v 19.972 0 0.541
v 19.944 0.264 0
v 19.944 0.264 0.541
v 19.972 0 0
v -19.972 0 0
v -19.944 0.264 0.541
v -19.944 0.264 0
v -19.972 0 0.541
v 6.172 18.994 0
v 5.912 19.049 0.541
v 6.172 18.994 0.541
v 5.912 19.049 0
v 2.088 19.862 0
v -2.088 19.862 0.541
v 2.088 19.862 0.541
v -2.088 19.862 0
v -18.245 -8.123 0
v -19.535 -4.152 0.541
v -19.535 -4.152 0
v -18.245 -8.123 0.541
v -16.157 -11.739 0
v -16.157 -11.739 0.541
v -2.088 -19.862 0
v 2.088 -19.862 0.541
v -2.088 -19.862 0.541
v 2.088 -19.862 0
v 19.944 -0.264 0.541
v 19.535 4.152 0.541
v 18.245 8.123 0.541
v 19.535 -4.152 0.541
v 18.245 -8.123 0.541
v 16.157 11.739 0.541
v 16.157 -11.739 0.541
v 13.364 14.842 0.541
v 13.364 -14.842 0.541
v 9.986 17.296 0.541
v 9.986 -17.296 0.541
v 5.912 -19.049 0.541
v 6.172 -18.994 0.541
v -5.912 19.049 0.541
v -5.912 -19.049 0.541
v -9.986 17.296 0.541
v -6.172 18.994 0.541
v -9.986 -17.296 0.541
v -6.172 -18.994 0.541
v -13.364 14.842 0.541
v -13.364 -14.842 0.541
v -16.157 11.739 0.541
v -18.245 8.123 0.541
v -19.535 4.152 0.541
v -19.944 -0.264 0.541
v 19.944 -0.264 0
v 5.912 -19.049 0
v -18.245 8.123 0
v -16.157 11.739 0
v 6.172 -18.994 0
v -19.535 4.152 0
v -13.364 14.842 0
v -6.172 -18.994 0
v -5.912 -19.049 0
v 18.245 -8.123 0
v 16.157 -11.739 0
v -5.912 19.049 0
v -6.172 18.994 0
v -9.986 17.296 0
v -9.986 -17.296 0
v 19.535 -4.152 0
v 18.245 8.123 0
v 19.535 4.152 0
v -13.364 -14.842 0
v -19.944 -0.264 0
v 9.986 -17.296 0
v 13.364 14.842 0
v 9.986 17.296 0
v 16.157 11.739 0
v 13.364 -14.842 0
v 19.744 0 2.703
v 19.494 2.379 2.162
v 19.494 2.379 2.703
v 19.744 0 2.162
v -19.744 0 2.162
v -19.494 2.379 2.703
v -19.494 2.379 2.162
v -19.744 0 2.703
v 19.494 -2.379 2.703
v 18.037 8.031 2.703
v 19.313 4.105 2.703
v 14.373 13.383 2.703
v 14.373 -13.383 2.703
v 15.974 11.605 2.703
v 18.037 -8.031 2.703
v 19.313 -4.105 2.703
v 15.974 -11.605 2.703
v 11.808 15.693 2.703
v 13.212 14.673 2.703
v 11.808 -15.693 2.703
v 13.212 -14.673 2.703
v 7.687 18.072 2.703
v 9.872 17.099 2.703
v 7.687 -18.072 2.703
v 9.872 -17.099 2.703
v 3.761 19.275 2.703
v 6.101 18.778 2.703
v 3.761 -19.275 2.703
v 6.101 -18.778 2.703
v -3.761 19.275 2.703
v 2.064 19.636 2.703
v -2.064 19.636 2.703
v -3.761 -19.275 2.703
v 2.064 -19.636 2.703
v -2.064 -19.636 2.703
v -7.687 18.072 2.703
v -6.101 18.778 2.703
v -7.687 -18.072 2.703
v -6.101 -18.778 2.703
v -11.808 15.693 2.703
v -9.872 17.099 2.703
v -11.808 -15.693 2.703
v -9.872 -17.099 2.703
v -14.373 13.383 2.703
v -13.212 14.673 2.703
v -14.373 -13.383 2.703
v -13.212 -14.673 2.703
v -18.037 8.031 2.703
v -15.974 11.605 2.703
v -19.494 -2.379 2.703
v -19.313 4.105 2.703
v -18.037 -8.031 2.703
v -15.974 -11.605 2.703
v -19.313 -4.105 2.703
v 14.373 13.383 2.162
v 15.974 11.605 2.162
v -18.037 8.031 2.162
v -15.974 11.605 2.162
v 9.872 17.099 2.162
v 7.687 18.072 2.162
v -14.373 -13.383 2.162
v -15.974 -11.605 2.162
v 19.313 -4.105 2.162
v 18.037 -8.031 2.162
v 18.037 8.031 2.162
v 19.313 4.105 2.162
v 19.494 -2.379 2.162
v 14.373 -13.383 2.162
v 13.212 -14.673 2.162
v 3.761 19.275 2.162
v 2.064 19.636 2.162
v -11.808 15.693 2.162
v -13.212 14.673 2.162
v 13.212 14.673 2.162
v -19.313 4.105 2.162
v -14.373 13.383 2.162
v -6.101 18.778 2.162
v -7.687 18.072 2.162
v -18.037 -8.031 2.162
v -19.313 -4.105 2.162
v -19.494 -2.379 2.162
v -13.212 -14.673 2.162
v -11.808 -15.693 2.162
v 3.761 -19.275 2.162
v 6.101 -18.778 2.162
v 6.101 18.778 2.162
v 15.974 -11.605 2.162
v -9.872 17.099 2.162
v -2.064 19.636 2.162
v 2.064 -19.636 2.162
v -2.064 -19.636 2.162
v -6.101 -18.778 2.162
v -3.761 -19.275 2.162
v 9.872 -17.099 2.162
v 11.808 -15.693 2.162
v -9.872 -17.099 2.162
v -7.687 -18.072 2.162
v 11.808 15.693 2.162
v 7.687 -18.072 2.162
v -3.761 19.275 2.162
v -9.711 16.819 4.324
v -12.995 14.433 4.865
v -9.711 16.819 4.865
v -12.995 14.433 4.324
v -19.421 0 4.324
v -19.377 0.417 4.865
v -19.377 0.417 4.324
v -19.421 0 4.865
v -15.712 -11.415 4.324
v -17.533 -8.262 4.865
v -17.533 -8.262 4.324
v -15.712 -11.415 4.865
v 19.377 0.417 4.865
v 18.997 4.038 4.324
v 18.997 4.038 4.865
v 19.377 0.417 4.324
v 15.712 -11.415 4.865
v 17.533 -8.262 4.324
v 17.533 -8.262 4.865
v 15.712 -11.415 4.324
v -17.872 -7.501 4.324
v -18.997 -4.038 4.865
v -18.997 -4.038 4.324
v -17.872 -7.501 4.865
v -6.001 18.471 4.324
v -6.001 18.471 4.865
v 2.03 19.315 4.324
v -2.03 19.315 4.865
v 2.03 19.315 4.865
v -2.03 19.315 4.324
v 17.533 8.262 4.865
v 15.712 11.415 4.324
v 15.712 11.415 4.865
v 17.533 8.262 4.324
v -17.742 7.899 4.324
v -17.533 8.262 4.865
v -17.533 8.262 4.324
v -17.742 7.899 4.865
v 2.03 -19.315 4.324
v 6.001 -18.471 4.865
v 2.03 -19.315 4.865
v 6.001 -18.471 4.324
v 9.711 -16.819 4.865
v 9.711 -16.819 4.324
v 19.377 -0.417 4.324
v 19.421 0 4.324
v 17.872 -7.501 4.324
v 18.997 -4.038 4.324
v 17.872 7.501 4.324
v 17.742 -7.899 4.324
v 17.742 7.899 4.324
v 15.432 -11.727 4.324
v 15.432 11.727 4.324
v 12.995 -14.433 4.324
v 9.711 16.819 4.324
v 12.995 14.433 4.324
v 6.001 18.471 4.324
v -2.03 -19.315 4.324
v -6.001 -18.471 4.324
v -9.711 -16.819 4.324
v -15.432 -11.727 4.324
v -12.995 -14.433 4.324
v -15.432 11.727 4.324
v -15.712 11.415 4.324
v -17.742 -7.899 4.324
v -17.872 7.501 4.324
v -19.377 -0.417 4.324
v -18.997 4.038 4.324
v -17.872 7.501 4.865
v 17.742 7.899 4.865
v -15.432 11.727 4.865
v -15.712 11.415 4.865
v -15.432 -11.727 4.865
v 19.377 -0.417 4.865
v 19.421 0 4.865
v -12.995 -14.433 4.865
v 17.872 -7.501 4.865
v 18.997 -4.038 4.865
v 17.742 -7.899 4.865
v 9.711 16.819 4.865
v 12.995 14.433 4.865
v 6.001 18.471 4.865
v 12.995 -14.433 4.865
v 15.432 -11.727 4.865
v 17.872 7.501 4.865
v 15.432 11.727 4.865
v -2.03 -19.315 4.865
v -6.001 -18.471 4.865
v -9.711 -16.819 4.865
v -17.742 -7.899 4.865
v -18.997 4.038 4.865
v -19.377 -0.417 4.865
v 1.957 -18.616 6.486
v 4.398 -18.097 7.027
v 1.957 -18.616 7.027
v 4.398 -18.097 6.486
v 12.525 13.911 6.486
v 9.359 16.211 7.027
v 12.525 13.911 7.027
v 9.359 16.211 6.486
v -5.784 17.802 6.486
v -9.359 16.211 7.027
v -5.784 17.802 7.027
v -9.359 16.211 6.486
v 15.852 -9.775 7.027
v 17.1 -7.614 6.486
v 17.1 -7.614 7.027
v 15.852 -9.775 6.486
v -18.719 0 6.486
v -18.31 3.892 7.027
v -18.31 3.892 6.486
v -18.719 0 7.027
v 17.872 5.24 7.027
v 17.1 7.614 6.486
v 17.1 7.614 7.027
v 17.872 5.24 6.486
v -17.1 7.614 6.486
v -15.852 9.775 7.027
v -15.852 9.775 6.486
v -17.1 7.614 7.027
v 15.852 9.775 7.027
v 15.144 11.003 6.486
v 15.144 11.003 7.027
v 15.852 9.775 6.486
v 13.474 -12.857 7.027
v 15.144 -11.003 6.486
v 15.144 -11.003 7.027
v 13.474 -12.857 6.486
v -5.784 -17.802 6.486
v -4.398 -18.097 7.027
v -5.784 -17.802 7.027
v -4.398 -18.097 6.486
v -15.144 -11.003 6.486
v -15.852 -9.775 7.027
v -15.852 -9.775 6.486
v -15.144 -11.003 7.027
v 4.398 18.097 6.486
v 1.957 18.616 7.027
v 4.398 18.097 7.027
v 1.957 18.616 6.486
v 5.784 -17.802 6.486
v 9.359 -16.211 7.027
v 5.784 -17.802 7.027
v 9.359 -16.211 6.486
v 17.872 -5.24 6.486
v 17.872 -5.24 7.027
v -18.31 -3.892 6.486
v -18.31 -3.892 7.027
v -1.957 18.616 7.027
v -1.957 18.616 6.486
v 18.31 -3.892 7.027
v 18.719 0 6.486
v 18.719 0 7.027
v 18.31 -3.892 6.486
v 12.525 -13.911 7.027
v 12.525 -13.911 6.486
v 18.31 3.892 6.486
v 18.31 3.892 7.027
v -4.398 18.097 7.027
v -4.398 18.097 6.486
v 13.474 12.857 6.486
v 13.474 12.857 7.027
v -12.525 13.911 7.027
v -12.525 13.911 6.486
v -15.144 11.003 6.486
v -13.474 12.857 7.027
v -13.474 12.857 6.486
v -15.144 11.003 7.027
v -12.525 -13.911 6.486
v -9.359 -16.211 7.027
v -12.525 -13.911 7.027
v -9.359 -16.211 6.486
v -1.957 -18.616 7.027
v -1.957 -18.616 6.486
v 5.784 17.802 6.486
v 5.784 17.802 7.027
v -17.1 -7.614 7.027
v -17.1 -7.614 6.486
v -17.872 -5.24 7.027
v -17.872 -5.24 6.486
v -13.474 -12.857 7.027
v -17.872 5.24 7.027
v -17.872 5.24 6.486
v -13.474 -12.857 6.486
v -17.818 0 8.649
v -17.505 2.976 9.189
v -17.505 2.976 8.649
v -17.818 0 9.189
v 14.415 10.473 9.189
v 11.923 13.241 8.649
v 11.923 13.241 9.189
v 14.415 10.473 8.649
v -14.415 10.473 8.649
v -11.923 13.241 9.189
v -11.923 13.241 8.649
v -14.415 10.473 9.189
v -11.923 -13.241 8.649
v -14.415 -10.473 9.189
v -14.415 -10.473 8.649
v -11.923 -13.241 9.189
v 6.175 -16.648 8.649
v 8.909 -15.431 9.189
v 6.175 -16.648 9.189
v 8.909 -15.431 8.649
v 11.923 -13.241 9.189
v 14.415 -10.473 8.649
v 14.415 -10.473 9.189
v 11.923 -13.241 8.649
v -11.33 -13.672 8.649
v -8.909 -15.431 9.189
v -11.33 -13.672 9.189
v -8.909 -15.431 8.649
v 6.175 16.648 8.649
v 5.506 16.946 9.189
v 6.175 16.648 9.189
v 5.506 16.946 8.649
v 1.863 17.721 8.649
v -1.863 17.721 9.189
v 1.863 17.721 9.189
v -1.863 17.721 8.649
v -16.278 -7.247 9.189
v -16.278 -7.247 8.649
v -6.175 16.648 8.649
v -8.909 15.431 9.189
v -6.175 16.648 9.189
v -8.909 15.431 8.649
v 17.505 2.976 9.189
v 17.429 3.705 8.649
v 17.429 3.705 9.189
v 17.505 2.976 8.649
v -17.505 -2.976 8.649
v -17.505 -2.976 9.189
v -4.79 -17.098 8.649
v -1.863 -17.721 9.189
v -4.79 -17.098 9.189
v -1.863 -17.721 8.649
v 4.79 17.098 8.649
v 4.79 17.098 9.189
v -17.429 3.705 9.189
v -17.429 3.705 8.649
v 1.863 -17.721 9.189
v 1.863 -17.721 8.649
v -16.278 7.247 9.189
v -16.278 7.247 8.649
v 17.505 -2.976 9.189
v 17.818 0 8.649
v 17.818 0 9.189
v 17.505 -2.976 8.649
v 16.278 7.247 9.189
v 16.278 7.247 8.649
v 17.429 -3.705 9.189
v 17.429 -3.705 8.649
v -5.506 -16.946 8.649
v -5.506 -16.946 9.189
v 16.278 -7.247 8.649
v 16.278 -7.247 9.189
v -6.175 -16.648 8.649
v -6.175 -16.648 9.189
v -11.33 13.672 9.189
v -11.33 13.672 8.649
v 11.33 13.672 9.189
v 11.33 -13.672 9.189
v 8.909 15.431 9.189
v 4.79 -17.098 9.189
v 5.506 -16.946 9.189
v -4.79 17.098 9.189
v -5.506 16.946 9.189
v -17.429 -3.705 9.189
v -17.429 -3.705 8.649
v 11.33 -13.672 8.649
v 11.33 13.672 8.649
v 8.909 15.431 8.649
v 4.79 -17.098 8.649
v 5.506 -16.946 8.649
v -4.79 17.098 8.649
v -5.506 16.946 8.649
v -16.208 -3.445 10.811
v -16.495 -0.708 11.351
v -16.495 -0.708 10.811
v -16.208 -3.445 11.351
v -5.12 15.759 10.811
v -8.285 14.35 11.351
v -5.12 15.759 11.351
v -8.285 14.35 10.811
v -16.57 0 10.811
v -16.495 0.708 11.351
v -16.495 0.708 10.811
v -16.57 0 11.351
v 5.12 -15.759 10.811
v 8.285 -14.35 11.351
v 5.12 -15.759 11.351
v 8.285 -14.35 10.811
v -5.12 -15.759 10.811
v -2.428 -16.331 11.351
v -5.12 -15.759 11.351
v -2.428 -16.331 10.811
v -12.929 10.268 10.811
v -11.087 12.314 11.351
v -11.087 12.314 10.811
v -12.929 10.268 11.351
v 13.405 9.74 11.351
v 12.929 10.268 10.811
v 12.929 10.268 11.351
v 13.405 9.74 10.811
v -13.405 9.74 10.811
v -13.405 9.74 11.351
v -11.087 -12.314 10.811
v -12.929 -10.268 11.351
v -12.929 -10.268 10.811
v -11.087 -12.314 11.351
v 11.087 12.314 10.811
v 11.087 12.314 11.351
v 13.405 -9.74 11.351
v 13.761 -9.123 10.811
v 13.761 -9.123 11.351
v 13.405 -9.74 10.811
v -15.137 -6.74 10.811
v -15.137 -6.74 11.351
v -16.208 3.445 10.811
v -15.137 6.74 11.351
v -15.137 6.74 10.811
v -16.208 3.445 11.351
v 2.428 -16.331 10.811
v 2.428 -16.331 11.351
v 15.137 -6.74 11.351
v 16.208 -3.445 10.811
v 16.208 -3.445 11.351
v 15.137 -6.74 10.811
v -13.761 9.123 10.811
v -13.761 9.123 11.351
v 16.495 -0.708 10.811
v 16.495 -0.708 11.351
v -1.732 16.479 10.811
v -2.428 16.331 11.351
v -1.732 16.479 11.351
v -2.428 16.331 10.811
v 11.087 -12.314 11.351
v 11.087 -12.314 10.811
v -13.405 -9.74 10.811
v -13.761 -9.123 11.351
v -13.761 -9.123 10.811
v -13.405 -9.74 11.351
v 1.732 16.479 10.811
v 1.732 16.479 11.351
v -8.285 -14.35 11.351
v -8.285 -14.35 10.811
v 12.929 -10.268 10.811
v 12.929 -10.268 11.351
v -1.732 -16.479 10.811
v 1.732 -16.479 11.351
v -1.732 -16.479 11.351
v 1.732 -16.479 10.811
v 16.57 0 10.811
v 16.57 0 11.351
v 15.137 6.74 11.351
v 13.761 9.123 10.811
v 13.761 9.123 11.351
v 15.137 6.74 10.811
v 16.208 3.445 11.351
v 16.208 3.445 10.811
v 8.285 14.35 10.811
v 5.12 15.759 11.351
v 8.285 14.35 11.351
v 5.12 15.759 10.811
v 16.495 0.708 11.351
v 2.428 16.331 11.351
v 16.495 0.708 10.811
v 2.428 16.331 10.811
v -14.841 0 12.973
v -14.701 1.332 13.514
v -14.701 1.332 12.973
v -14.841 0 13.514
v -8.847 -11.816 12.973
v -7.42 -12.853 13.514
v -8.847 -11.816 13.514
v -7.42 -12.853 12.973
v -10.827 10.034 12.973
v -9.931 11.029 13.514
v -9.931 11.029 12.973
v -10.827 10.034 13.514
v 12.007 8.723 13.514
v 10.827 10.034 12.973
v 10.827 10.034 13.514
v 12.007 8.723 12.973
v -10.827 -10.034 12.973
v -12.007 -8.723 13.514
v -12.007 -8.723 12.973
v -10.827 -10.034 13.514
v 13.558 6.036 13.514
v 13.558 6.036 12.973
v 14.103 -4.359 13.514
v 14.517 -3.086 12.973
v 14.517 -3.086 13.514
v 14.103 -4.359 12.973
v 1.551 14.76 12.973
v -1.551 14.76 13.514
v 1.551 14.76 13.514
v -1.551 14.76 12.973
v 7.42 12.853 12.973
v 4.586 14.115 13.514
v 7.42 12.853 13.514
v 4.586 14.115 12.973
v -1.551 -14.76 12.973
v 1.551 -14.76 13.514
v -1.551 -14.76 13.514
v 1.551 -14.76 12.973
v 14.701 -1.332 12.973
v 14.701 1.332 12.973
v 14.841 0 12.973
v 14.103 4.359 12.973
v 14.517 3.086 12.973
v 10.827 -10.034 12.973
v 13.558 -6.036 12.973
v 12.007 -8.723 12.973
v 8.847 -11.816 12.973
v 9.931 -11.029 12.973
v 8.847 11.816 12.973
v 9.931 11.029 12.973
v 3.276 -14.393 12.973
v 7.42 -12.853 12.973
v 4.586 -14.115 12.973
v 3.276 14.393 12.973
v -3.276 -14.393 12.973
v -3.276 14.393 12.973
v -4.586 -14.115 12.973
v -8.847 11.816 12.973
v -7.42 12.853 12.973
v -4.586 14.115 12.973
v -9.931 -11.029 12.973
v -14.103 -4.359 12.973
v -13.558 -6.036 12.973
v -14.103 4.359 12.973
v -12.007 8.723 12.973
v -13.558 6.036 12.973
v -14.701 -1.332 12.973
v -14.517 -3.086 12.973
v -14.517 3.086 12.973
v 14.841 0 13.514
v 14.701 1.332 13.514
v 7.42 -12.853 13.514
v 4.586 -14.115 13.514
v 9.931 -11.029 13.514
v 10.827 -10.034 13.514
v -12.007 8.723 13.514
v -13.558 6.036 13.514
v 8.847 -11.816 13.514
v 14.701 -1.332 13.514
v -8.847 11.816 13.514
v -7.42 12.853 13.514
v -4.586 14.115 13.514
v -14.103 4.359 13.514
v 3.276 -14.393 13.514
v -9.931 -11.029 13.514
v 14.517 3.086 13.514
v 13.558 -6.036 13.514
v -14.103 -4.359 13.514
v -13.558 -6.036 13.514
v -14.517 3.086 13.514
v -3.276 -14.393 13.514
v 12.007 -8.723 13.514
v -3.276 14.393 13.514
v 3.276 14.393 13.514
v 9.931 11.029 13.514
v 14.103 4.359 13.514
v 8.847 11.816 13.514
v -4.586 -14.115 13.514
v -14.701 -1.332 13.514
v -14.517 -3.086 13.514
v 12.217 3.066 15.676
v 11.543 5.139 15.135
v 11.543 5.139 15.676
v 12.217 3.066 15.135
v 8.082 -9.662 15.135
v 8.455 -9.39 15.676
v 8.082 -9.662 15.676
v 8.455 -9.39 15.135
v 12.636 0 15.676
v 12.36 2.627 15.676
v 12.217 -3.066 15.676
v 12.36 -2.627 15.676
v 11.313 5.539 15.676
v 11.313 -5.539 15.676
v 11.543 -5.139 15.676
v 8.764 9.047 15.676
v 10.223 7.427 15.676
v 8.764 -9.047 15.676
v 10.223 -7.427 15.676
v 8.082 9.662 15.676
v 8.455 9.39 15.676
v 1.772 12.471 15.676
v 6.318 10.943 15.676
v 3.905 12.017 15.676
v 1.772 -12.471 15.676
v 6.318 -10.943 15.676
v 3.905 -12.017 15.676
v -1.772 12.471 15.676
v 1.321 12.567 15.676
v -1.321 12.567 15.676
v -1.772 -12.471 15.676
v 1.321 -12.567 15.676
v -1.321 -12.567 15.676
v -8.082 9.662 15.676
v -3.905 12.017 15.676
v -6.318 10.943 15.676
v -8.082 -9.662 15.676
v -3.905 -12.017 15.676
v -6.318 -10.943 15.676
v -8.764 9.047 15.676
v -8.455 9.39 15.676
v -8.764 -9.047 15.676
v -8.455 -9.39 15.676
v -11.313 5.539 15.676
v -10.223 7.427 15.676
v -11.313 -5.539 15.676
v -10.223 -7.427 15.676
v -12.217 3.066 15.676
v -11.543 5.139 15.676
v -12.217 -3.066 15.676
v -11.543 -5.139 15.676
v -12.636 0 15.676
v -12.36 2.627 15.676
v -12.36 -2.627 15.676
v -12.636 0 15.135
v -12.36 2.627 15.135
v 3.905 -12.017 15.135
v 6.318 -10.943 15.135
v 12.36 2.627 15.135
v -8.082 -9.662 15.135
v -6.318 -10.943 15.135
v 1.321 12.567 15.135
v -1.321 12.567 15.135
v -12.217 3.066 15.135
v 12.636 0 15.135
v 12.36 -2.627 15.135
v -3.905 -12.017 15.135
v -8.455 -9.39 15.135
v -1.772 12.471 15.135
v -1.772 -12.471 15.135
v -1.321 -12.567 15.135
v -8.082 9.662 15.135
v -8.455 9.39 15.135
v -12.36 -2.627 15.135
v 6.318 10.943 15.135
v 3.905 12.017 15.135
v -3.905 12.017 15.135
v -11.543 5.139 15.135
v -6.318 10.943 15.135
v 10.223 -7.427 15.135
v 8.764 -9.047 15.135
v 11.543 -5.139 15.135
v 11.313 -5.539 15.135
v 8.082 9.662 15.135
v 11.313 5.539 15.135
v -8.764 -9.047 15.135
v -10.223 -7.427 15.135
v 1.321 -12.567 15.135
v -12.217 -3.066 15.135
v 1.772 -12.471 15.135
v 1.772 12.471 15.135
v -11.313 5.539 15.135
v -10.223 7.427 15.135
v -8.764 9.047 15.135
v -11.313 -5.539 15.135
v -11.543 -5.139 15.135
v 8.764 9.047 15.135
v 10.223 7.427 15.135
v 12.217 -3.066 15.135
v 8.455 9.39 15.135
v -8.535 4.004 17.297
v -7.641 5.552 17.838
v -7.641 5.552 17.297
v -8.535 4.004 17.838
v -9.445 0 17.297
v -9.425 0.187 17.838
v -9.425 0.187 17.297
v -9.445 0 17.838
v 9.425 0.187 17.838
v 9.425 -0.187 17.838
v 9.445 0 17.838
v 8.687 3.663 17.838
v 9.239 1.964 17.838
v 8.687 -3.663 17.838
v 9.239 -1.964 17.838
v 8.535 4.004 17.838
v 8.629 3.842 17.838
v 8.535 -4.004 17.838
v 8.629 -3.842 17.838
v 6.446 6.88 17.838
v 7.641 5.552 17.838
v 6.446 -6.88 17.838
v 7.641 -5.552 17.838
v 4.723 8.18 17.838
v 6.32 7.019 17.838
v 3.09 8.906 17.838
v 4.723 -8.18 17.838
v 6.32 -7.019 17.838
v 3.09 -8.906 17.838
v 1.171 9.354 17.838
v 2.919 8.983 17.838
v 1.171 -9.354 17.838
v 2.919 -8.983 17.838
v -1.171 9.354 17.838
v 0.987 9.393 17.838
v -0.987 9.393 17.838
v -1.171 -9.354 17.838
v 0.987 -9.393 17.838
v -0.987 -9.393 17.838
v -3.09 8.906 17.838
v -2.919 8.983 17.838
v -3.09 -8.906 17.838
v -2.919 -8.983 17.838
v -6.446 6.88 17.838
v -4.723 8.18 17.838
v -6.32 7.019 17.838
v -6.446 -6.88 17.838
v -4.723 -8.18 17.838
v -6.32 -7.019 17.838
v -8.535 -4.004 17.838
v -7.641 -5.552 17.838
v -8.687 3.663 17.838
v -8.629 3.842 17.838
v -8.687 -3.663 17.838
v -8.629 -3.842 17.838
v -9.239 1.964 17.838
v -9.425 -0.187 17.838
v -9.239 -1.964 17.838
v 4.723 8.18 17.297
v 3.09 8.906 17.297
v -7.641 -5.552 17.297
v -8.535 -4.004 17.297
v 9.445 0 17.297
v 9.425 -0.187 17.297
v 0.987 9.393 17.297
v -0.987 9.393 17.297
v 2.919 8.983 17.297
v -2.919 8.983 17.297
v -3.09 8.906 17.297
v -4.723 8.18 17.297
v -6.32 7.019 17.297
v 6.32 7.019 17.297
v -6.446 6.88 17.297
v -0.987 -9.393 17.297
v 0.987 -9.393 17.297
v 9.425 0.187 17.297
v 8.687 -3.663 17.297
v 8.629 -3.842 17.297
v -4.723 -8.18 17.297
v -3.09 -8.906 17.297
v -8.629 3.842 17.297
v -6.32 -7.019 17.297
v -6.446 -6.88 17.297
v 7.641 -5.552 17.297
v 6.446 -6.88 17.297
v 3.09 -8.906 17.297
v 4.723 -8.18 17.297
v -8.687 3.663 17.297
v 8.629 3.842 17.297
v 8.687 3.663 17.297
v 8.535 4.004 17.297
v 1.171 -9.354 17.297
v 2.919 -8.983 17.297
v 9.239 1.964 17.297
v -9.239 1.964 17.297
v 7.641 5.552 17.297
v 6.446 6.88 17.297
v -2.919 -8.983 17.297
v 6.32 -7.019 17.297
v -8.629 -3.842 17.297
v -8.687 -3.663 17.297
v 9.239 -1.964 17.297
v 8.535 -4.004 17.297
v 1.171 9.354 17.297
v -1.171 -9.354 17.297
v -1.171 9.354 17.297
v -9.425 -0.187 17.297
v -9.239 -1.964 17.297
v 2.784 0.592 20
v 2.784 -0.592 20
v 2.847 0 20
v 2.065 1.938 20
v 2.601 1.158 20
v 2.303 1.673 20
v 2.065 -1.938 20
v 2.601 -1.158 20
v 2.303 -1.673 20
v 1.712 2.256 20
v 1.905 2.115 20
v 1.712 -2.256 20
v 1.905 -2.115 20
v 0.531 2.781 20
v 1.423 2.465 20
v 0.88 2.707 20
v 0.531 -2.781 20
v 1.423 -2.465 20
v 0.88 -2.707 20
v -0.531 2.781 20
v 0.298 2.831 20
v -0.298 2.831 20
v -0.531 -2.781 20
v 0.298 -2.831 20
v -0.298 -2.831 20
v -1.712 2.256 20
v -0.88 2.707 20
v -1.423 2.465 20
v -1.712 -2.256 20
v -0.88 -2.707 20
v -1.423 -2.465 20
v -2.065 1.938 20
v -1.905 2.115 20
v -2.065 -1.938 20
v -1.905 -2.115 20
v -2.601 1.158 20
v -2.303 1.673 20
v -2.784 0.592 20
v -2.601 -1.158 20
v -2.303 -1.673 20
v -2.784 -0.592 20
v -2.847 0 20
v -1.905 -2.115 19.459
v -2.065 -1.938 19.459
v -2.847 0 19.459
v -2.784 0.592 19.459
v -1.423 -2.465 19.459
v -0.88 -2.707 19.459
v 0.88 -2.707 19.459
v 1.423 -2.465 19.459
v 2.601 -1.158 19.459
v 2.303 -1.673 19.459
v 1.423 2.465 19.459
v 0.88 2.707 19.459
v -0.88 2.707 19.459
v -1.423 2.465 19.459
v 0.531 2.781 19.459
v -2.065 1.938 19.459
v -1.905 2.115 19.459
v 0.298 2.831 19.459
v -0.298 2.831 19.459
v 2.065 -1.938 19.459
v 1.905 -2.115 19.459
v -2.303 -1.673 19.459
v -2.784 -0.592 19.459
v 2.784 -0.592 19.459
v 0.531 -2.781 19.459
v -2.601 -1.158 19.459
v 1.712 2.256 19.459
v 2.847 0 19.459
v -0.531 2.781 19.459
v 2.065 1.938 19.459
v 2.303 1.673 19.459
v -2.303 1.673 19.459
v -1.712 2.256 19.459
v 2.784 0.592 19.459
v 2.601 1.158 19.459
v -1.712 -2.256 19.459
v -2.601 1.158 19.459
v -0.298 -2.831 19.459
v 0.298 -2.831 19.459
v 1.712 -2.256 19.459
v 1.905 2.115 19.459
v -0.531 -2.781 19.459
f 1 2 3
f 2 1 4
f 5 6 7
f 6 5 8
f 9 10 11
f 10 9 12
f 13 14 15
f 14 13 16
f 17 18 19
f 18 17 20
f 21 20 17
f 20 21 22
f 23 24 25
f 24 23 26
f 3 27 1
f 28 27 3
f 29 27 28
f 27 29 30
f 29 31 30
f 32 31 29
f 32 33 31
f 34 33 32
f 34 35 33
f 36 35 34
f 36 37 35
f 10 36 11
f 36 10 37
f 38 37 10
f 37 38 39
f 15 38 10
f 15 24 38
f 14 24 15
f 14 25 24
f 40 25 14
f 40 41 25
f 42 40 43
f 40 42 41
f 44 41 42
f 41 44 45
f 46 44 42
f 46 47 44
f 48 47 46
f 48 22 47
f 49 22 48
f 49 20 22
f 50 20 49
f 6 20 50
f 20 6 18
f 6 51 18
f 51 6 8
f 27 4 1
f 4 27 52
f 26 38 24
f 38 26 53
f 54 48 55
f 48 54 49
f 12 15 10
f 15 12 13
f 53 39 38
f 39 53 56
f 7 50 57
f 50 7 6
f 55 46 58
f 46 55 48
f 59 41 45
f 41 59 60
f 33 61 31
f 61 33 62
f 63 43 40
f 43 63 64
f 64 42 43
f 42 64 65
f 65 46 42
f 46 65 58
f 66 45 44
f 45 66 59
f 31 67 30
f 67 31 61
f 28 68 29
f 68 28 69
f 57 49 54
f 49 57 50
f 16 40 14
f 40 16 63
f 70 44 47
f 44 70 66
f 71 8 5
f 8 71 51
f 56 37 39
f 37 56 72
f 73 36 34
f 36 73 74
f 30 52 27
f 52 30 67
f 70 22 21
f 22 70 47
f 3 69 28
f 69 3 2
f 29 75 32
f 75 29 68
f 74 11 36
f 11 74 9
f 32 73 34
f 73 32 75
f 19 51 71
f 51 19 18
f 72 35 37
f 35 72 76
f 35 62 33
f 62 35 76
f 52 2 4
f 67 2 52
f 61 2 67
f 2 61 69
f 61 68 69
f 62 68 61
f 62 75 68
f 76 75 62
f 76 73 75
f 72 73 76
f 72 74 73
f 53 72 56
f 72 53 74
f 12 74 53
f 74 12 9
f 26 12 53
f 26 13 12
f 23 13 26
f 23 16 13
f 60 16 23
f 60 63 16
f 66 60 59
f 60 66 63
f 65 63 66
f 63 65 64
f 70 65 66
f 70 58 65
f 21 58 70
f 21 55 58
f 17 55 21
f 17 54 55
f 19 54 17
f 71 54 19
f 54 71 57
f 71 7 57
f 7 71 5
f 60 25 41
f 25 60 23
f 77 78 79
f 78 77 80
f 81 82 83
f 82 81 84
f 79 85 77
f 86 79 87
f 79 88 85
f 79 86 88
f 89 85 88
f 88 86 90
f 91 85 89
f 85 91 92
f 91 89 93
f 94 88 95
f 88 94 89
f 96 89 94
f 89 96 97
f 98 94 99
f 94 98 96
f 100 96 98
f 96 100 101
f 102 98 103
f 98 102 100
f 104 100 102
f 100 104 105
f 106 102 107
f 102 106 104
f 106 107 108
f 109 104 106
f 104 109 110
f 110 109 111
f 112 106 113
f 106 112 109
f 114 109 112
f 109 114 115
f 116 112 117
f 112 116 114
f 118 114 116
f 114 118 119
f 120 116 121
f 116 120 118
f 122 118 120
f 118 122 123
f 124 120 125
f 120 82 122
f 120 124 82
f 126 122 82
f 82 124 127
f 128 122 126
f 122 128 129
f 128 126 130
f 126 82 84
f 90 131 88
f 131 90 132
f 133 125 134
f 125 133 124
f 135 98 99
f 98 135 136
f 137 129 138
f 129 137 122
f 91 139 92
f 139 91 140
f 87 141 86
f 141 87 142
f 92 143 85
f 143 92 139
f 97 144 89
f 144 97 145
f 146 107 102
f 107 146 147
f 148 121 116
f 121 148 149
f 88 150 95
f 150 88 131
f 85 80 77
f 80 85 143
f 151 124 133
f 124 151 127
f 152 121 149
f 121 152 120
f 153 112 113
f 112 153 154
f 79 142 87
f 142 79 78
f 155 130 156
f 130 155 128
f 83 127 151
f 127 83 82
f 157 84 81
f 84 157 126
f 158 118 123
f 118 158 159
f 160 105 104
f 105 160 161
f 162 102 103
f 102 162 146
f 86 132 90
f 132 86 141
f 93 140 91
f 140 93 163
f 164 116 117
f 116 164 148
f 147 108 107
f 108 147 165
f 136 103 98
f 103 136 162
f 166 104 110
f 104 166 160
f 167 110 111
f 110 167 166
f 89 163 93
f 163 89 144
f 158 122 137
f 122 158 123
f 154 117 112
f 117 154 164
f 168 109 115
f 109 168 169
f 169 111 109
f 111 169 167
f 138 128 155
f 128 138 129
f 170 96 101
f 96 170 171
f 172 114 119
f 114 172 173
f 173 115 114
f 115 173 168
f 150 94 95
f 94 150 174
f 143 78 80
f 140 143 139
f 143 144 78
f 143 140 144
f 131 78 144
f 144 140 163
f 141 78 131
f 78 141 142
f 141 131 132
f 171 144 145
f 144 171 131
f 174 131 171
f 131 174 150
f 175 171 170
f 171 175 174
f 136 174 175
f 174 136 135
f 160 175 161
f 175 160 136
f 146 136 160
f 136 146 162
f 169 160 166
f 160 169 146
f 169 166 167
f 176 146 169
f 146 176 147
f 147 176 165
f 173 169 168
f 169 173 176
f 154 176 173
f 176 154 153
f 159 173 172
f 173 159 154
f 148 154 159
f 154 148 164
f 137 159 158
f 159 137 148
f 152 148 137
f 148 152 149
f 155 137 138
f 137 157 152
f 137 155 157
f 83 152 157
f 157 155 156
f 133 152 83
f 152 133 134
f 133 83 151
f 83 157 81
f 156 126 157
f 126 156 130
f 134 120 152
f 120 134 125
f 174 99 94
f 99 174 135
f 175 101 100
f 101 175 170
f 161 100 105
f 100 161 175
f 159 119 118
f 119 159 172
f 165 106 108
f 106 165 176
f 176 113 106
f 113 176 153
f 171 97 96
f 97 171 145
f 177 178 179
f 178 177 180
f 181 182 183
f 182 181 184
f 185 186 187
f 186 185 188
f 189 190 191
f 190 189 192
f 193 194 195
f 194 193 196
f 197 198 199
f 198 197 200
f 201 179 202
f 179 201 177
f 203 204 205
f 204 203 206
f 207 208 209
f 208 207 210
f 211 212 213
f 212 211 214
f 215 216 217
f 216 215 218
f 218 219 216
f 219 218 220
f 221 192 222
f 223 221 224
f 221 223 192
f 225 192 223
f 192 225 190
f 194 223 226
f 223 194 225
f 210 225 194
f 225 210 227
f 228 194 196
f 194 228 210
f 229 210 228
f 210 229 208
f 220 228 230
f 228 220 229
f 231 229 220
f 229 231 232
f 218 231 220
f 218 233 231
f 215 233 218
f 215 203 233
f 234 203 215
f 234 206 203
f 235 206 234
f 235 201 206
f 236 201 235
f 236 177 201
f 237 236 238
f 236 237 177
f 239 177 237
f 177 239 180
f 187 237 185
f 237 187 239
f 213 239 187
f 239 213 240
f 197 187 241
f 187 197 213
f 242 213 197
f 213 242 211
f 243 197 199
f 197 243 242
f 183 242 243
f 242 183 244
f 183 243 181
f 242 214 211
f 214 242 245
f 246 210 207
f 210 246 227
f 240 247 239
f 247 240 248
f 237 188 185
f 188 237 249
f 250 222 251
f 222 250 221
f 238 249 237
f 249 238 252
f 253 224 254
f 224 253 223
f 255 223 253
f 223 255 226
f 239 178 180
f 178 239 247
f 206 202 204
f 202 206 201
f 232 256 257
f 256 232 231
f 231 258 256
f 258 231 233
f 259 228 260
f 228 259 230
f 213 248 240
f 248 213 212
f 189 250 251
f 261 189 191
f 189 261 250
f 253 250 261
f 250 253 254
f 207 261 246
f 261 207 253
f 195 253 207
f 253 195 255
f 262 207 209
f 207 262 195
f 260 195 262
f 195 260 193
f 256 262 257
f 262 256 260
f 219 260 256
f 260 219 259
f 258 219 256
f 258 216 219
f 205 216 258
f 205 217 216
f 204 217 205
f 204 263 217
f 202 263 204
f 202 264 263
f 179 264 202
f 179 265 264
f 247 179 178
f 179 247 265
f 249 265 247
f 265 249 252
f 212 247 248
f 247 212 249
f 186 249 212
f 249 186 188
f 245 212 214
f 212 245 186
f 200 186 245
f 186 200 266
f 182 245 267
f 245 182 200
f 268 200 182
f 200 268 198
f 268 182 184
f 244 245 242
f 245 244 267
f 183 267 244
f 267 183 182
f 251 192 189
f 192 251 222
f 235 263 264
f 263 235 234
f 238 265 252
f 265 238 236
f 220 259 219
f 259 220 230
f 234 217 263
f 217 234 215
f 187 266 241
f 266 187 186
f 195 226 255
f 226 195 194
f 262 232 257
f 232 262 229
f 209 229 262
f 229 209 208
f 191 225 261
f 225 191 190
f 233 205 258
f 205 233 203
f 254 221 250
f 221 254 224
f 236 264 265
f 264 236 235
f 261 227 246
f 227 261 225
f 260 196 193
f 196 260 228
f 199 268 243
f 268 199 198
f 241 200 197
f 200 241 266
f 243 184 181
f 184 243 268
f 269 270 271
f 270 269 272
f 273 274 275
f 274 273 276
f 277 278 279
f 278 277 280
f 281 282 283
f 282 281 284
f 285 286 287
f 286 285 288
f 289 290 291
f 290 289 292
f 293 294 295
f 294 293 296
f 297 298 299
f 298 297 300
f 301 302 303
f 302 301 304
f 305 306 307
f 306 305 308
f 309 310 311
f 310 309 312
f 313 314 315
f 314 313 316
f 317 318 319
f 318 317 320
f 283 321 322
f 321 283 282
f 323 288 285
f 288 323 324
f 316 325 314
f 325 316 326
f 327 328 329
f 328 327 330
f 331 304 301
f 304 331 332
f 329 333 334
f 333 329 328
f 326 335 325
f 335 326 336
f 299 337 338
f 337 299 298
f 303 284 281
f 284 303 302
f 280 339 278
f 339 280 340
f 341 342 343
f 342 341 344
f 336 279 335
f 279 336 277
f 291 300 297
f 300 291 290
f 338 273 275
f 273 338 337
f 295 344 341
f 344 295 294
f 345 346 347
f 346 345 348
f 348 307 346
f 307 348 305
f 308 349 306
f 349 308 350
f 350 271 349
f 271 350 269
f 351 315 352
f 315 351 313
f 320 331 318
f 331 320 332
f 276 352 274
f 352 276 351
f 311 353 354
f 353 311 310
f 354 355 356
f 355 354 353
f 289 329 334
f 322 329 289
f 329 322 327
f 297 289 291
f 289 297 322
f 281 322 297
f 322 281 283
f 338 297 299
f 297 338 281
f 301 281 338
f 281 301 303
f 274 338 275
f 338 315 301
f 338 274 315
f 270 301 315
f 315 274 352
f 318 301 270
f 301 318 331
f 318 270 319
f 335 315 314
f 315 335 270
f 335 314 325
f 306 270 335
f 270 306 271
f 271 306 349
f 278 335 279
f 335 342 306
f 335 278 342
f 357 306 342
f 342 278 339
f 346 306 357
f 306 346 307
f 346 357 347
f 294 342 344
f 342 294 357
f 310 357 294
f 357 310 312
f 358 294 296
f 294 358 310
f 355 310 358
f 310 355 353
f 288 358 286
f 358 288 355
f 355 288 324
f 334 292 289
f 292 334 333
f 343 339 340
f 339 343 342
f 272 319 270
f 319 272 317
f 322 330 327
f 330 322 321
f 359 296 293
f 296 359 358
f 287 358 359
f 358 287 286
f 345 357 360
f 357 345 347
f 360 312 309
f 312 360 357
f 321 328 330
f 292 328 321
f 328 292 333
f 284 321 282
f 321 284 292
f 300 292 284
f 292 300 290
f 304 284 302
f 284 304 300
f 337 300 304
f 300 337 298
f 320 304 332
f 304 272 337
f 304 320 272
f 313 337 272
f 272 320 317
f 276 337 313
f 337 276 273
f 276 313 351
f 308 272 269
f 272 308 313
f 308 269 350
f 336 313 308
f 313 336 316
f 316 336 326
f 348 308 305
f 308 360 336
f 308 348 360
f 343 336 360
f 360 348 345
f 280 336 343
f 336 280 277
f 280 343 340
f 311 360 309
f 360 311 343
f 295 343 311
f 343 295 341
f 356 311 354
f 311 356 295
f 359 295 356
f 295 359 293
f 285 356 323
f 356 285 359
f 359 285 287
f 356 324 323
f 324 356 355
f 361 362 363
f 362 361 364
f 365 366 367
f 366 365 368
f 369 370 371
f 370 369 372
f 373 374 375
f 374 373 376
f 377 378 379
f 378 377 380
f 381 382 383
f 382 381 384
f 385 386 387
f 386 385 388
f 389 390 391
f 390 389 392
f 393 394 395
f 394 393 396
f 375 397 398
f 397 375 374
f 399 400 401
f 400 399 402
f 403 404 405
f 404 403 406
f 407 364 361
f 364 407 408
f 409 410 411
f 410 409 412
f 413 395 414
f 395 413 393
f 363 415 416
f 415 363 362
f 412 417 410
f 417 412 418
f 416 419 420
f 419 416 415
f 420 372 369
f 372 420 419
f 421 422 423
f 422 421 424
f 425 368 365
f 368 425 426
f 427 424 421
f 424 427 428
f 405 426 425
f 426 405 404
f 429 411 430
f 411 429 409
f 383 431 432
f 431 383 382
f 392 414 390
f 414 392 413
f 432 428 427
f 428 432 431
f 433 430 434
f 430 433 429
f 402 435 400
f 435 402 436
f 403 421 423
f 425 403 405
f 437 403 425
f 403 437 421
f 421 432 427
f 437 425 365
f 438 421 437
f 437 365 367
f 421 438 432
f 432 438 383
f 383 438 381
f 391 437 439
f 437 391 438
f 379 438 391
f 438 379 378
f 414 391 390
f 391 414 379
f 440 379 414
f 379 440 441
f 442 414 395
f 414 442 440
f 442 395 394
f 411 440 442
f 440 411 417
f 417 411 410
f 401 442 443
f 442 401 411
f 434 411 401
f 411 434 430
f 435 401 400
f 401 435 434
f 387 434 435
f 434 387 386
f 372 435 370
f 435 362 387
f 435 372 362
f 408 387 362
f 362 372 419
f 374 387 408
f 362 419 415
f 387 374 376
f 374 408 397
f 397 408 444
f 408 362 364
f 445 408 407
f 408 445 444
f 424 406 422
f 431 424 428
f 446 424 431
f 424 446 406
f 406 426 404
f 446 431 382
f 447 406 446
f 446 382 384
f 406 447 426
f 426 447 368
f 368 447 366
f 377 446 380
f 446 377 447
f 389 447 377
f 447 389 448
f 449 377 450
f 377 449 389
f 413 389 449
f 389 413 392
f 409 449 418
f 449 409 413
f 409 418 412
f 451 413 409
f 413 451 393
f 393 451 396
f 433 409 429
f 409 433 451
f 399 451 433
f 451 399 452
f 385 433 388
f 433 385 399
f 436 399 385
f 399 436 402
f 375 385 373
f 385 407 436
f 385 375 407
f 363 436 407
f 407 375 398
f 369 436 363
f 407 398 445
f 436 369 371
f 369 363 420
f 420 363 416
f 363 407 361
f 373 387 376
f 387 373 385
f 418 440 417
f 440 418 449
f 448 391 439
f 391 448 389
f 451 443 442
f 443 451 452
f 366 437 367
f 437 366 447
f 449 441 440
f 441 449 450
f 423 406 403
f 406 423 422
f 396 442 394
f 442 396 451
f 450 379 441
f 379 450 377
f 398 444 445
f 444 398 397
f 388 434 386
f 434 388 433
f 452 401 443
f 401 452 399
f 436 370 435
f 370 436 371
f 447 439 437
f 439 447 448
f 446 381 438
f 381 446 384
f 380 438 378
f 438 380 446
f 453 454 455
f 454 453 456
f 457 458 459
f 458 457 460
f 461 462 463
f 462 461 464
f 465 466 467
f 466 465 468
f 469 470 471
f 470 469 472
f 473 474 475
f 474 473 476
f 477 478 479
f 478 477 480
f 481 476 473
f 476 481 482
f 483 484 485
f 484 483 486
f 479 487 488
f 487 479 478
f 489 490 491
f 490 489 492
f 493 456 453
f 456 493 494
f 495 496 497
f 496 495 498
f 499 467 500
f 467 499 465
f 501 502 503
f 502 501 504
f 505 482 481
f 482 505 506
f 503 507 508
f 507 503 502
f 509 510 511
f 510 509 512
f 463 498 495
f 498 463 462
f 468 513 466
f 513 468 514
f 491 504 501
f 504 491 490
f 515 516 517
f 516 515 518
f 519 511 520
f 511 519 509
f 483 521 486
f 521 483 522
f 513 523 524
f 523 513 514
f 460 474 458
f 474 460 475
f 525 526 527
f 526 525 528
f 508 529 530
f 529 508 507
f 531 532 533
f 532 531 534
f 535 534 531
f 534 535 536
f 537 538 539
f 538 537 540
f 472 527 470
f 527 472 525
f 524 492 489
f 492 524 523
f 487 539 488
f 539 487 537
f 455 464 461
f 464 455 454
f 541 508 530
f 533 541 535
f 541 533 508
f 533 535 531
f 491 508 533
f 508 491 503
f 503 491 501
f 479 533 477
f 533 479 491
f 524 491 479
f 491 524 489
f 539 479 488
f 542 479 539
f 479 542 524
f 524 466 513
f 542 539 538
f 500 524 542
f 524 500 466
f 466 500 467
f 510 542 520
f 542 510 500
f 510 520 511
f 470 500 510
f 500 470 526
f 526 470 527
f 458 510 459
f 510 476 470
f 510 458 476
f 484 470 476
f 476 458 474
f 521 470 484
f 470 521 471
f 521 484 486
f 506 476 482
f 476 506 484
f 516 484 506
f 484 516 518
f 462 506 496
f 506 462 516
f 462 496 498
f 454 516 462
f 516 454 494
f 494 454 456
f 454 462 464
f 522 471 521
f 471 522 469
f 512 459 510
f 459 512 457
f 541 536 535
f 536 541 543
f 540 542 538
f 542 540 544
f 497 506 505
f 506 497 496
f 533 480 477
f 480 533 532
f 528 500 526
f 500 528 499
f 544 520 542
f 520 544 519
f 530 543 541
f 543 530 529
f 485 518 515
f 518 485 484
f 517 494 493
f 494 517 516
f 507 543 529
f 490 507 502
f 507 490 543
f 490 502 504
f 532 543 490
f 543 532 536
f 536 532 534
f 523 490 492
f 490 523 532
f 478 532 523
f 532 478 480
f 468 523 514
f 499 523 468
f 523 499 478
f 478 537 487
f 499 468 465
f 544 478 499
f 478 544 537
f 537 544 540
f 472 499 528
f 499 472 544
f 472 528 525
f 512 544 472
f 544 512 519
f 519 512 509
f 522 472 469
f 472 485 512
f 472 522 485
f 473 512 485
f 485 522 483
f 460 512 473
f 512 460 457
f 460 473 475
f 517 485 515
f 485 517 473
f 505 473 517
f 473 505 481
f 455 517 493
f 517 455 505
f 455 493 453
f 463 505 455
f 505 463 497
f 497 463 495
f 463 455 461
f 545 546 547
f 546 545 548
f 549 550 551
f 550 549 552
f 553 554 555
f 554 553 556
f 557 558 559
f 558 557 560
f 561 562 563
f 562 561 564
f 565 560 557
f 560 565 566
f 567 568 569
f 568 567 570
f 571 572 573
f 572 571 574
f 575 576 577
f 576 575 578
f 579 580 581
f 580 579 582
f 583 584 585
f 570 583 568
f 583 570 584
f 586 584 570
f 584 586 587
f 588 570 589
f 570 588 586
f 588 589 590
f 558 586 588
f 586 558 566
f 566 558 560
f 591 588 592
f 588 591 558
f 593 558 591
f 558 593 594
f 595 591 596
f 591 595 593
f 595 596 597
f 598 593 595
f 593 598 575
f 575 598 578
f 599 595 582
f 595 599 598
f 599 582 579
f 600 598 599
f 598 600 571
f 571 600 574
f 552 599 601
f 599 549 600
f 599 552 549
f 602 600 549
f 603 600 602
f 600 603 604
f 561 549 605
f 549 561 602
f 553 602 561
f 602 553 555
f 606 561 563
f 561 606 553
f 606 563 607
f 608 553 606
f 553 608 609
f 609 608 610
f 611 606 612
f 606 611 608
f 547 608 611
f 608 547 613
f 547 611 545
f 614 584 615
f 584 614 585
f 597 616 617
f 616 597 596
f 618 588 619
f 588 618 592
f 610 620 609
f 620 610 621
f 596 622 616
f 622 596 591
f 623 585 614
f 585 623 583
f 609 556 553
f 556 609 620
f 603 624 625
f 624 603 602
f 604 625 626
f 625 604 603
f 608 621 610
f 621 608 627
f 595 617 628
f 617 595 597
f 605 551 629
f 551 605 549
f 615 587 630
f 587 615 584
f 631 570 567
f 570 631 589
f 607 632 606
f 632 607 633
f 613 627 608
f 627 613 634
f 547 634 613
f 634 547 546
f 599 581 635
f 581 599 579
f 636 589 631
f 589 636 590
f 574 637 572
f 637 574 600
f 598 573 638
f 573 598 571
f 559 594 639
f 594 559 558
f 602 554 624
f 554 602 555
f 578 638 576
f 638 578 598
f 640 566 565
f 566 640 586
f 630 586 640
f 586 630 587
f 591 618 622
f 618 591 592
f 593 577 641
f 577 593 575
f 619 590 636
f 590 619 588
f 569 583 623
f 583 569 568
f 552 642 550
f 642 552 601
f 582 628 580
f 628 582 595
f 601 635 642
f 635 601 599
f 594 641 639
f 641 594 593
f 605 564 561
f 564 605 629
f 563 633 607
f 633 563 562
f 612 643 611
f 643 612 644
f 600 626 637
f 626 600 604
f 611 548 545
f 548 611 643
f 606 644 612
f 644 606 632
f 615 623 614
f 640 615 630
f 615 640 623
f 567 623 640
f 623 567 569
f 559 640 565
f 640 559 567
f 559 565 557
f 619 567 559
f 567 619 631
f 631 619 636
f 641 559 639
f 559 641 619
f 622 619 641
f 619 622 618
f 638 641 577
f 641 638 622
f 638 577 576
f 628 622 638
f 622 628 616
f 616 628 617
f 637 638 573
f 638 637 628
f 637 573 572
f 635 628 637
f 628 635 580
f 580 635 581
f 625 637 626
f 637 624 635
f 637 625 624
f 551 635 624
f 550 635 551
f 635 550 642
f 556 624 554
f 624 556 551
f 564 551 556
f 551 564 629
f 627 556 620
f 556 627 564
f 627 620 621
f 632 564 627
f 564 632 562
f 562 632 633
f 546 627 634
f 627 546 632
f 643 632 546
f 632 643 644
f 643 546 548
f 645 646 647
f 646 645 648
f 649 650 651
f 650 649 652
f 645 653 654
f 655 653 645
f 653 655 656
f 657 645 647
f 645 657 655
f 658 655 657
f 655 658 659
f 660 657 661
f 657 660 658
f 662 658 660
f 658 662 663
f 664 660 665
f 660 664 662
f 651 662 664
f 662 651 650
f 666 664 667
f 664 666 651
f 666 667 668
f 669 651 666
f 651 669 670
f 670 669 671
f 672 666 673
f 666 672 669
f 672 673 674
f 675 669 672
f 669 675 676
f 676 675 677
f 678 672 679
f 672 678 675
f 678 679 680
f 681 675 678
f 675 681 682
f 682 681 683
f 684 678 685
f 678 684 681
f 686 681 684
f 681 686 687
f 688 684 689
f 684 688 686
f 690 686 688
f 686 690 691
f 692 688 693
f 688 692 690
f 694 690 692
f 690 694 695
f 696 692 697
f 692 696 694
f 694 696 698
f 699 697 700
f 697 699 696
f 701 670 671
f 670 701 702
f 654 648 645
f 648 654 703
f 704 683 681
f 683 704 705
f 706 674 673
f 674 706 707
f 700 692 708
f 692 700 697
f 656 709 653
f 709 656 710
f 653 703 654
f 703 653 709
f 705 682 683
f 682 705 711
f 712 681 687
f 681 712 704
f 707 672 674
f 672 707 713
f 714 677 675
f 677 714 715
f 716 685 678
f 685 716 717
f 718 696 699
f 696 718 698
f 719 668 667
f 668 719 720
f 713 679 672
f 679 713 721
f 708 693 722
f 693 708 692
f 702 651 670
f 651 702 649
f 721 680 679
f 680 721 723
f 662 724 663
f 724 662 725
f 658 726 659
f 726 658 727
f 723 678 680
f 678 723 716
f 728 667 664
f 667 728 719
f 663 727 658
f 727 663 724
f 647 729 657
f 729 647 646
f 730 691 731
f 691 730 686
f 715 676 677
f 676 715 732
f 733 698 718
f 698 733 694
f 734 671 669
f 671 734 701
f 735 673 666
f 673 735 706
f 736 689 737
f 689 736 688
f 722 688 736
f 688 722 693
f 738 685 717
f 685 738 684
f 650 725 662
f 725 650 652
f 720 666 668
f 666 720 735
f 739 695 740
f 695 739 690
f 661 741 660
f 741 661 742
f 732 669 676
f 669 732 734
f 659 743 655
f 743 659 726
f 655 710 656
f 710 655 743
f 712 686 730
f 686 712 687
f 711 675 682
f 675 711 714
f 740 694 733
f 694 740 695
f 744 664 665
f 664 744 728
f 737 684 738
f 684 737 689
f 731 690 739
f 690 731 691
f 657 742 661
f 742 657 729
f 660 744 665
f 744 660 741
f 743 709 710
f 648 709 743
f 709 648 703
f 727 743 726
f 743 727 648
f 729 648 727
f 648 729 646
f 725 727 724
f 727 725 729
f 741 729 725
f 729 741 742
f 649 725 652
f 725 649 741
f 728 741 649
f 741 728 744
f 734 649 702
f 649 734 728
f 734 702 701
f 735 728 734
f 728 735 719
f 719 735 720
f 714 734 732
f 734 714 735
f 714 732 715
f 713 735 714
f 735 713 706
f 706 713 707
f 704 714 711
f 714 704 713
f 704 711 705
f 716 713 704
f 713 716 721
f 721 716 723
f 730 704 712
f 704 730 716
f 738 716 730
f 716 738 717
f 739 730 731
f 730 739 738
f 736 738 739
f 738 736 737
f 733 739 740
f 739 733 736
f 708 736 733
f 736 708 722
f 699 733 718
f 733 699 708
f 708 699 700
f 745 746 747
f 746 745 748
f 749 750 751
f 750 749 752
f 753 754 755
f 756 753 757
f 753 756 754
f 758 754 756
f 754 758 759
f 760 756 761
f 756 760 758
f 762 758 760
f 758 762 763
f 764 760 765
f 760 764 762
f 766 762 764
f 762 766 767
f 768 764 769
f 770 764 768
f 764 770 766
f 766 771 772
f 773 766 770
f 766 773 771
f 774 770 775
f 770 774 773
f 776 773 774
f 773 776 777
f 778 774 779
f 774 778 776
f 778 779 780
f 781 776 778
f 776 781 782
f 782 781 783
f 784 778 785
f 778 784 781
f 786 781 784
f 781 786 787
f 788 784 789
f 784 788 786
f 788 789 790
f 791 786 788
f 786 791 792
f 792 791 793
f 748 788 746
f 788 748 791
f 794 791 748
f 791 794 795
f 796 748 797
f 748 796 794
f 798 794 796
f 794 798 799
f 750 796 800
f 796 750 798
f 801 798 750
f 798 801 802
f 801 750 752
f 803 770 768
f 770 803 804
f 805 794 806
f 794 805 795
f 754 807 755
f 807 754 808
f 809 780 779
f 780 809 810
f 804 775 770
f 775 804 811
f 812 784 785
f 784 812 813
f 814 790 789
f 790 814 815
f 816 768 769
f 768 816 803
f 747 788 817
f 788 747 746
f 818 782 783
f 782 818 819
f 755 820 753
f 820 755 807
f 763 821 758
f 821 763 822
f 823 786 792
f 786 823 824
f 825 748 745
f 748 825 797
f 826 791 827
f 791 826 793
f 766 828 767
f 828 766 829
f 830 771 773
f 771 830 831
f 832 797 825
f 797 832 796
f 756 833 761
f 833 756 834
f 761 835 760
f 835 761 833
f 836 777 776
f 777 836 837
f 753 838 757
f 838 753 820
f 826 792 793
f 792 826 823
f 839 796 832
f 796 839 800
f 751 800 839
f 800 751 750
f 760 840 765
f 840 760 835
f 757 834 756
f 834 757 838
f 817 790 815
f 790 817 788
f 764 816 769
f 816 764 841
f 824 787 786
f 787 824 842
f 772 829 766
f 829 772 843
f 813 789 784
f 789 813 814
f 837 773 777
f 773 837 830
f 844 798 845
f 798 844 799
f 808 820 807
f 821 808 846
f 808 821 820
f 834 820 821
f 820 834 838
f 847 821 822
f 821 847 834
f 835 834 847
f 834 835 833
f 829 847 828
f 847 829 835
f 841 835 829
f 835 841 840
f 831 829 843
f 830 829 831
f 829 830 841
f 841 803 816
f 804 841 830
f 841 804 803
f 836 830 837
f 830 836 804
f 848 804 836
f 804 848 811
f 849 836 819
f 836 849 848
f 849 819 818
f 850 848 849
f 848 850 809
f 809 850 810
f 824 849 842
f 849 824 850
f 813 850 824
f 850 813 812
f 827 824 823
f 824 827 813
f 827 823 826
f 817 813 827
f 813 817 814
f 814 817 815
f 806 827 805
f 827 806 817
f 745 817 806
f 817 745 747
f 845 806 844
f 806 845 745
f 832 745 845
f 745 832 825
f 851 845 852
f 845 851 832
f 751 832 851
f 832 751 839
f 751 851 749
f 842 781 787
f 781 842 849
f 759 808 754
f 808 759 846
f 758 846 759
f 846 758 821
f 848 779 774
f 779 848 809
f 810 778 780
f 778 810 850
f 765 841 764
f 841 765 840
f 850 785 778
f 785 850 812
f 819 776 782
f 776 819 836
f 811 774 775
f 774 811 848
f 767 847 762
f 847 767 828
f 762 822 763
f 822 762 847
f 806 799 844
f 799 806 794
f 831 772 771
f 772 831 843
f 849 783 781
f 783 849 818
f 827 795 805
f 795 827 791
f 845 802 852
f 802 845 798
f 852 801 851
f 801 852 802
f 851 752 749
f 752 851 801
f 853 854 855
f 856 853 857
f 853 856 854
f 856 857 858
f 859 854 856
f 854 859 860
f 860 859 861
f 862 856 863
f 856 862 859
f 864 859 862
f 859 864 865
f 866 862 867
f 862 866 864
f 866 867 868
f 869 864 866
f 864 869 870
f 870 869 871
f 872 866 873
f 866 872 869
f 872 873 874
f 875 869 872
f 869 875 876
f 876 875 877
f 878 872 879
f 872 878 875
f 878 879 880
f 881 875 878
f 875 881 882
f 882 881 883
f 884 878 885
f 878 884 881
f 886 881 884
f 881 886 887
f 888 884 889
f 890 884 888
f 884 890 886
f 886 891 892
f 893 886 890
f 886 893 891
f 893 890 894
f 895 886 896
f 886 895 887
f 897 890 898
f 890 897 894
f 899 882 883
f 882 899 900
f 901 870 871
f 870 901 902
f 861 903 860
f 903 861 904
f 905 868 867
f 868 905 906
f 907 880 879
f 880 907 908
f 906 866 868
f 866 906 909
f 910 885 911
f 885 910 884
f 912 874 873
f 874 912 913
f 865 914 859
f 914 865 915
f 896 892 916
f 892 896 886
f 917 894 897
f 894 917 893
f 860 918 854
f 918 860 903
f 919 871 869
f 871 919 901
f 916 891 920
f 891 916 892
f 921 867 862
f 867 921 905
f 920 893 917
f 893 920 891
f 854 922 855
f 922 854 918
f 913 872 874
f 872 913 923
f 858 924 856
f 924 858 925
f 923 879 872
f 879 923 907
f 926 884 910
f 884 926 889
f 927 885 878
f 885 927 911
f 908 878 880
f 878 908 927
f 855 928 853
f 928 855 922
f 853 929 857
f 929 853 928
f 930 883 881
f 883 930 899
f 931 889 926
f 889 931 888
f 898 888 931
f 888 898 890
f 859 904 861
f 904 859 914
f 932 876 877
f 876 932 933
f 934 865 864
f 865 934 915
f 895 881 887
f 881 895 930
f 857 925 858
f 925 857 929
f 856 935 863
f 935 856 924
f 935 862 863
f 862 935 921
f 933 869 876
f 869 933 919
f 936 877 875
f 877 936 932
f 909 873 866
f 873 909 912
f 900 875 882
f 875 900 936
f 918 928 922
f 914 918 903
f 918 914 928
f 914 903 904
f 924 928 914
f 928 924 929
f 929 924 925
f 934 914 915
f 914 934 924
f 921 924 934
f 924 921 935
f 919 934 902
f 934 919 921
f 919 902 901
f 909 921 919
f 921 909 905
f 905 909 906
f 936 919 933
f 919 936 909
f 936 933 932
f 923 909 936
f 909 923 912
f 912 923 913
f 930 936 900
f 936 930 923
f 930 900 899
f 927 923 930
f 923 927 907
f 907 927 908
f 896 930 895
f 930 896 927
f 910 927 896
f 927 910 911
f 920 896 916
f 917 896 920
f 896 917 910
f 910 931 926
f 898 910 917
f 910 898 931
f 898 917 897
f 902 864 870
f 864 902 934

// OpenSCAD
$fn = 30;

/*shape_height = 20;
slice_number = 10;
stepped = false;
flatten = false;*/


slice_ratio = 3.0;
//slice ratio is the ratio between the width of the slice and the width of the open space

//~~~~~~~~~~~~~~~~~~~~~~~~~~~~~~~~~~~~~~~~~~~~~~~~~~~~~~~~~~~~~~~~~~~



slicer(stepped = true, flatten = false, slice_number = 10, shape_height = 20) sphere(20);



/*

Needed: item dimensions(x,y,z), fill percentage, steppped(boolean), flatten(boolean)


Stuff to do: 
- height determination
- object maxium dimensions
- pass array of output slices

*/

module slicer(stepped, flatten, slice_number, shape_height){
    slice_thickness = shape_height/(slice_number +(slice_number-1)*slice_ratio);
    gap_thickness = slice_thickness*slice_ratio;
    
    if(stepped == false){
        if(flatten == false){
            slice_preview(slice_number, slice_thickness, gap_thickness)children();
        }
        else{
            slice_maker(slice_number, slice_thickness, gap_thickness)children();
        }
    }
    else{
        if(flatten == false){
            stepped_slice_preview(slice_number, slice_thickness, gap_thickness)children();
        }
        else{
            stepped_slice_maker(slice_number, slice_thickness, gap_thickness)children();
        }
    }
}
module deletion_cubes(slice_thickness){
    translate([0,0,-100])cube(200, center = true);
    translate([0,0,100+slice_thickness])cube(200, center = true);
}
module cut_slice(slice, slice_thickness, gap_thickness){ 
    difference(){
            translate([0,0,-slice*(slice_thickness+gap_thickness)])children();
            deletion_cubes(slice_thickness);
        }
}
module slice_maker(slice_number, slice_thickness, gap_thickness){
    for (slice = [0:slice_number -1]){
        translate([slice*20,0,0]){
            cut_slice(slice, slice_thickness, gap_thickness)children();
        }
    }
}
module slice_preview(slice_number, slice_thickness, gap_thickness){
   for (slice = [0:slice_number -1]){
        translate([0,0,slice*(gap_thickness+slice_thickness)]){
            cut_slice(slice,slice_thickness, gap_thickness)children();
        }
    } 
}
module cut_stepped_slice(slice, slice_thickness, gap_thickness){
    linear_extrude(height=slice_thickness, center = true)projection(cut = true) translate([0,0,-slice*(slice_thickness+gap_thickness)-slice_thickness/2])children();
}
module stepped_slice_preview(slice_number, slice_thickness, gap_thickness){
    for (slice = [0:slice_number -1]){
        translate([0,0,slice*(slice_thickness+gap_thickness)+slice_thickness/2]){
            cut_stepped_slice(slice, slice_thickness, gap_thickness)children();
        }
    } 
}
module stepped_slice_maker(slice_number, slice_thickness, gap_thickness){
    for (slice = [0:slice_number -1]){
        translate([slice*20,0,slice_thickness/2]){
            cut_stepped_slice(slice, slice_thickness, gap_thickness)children();
        }
    }
}
